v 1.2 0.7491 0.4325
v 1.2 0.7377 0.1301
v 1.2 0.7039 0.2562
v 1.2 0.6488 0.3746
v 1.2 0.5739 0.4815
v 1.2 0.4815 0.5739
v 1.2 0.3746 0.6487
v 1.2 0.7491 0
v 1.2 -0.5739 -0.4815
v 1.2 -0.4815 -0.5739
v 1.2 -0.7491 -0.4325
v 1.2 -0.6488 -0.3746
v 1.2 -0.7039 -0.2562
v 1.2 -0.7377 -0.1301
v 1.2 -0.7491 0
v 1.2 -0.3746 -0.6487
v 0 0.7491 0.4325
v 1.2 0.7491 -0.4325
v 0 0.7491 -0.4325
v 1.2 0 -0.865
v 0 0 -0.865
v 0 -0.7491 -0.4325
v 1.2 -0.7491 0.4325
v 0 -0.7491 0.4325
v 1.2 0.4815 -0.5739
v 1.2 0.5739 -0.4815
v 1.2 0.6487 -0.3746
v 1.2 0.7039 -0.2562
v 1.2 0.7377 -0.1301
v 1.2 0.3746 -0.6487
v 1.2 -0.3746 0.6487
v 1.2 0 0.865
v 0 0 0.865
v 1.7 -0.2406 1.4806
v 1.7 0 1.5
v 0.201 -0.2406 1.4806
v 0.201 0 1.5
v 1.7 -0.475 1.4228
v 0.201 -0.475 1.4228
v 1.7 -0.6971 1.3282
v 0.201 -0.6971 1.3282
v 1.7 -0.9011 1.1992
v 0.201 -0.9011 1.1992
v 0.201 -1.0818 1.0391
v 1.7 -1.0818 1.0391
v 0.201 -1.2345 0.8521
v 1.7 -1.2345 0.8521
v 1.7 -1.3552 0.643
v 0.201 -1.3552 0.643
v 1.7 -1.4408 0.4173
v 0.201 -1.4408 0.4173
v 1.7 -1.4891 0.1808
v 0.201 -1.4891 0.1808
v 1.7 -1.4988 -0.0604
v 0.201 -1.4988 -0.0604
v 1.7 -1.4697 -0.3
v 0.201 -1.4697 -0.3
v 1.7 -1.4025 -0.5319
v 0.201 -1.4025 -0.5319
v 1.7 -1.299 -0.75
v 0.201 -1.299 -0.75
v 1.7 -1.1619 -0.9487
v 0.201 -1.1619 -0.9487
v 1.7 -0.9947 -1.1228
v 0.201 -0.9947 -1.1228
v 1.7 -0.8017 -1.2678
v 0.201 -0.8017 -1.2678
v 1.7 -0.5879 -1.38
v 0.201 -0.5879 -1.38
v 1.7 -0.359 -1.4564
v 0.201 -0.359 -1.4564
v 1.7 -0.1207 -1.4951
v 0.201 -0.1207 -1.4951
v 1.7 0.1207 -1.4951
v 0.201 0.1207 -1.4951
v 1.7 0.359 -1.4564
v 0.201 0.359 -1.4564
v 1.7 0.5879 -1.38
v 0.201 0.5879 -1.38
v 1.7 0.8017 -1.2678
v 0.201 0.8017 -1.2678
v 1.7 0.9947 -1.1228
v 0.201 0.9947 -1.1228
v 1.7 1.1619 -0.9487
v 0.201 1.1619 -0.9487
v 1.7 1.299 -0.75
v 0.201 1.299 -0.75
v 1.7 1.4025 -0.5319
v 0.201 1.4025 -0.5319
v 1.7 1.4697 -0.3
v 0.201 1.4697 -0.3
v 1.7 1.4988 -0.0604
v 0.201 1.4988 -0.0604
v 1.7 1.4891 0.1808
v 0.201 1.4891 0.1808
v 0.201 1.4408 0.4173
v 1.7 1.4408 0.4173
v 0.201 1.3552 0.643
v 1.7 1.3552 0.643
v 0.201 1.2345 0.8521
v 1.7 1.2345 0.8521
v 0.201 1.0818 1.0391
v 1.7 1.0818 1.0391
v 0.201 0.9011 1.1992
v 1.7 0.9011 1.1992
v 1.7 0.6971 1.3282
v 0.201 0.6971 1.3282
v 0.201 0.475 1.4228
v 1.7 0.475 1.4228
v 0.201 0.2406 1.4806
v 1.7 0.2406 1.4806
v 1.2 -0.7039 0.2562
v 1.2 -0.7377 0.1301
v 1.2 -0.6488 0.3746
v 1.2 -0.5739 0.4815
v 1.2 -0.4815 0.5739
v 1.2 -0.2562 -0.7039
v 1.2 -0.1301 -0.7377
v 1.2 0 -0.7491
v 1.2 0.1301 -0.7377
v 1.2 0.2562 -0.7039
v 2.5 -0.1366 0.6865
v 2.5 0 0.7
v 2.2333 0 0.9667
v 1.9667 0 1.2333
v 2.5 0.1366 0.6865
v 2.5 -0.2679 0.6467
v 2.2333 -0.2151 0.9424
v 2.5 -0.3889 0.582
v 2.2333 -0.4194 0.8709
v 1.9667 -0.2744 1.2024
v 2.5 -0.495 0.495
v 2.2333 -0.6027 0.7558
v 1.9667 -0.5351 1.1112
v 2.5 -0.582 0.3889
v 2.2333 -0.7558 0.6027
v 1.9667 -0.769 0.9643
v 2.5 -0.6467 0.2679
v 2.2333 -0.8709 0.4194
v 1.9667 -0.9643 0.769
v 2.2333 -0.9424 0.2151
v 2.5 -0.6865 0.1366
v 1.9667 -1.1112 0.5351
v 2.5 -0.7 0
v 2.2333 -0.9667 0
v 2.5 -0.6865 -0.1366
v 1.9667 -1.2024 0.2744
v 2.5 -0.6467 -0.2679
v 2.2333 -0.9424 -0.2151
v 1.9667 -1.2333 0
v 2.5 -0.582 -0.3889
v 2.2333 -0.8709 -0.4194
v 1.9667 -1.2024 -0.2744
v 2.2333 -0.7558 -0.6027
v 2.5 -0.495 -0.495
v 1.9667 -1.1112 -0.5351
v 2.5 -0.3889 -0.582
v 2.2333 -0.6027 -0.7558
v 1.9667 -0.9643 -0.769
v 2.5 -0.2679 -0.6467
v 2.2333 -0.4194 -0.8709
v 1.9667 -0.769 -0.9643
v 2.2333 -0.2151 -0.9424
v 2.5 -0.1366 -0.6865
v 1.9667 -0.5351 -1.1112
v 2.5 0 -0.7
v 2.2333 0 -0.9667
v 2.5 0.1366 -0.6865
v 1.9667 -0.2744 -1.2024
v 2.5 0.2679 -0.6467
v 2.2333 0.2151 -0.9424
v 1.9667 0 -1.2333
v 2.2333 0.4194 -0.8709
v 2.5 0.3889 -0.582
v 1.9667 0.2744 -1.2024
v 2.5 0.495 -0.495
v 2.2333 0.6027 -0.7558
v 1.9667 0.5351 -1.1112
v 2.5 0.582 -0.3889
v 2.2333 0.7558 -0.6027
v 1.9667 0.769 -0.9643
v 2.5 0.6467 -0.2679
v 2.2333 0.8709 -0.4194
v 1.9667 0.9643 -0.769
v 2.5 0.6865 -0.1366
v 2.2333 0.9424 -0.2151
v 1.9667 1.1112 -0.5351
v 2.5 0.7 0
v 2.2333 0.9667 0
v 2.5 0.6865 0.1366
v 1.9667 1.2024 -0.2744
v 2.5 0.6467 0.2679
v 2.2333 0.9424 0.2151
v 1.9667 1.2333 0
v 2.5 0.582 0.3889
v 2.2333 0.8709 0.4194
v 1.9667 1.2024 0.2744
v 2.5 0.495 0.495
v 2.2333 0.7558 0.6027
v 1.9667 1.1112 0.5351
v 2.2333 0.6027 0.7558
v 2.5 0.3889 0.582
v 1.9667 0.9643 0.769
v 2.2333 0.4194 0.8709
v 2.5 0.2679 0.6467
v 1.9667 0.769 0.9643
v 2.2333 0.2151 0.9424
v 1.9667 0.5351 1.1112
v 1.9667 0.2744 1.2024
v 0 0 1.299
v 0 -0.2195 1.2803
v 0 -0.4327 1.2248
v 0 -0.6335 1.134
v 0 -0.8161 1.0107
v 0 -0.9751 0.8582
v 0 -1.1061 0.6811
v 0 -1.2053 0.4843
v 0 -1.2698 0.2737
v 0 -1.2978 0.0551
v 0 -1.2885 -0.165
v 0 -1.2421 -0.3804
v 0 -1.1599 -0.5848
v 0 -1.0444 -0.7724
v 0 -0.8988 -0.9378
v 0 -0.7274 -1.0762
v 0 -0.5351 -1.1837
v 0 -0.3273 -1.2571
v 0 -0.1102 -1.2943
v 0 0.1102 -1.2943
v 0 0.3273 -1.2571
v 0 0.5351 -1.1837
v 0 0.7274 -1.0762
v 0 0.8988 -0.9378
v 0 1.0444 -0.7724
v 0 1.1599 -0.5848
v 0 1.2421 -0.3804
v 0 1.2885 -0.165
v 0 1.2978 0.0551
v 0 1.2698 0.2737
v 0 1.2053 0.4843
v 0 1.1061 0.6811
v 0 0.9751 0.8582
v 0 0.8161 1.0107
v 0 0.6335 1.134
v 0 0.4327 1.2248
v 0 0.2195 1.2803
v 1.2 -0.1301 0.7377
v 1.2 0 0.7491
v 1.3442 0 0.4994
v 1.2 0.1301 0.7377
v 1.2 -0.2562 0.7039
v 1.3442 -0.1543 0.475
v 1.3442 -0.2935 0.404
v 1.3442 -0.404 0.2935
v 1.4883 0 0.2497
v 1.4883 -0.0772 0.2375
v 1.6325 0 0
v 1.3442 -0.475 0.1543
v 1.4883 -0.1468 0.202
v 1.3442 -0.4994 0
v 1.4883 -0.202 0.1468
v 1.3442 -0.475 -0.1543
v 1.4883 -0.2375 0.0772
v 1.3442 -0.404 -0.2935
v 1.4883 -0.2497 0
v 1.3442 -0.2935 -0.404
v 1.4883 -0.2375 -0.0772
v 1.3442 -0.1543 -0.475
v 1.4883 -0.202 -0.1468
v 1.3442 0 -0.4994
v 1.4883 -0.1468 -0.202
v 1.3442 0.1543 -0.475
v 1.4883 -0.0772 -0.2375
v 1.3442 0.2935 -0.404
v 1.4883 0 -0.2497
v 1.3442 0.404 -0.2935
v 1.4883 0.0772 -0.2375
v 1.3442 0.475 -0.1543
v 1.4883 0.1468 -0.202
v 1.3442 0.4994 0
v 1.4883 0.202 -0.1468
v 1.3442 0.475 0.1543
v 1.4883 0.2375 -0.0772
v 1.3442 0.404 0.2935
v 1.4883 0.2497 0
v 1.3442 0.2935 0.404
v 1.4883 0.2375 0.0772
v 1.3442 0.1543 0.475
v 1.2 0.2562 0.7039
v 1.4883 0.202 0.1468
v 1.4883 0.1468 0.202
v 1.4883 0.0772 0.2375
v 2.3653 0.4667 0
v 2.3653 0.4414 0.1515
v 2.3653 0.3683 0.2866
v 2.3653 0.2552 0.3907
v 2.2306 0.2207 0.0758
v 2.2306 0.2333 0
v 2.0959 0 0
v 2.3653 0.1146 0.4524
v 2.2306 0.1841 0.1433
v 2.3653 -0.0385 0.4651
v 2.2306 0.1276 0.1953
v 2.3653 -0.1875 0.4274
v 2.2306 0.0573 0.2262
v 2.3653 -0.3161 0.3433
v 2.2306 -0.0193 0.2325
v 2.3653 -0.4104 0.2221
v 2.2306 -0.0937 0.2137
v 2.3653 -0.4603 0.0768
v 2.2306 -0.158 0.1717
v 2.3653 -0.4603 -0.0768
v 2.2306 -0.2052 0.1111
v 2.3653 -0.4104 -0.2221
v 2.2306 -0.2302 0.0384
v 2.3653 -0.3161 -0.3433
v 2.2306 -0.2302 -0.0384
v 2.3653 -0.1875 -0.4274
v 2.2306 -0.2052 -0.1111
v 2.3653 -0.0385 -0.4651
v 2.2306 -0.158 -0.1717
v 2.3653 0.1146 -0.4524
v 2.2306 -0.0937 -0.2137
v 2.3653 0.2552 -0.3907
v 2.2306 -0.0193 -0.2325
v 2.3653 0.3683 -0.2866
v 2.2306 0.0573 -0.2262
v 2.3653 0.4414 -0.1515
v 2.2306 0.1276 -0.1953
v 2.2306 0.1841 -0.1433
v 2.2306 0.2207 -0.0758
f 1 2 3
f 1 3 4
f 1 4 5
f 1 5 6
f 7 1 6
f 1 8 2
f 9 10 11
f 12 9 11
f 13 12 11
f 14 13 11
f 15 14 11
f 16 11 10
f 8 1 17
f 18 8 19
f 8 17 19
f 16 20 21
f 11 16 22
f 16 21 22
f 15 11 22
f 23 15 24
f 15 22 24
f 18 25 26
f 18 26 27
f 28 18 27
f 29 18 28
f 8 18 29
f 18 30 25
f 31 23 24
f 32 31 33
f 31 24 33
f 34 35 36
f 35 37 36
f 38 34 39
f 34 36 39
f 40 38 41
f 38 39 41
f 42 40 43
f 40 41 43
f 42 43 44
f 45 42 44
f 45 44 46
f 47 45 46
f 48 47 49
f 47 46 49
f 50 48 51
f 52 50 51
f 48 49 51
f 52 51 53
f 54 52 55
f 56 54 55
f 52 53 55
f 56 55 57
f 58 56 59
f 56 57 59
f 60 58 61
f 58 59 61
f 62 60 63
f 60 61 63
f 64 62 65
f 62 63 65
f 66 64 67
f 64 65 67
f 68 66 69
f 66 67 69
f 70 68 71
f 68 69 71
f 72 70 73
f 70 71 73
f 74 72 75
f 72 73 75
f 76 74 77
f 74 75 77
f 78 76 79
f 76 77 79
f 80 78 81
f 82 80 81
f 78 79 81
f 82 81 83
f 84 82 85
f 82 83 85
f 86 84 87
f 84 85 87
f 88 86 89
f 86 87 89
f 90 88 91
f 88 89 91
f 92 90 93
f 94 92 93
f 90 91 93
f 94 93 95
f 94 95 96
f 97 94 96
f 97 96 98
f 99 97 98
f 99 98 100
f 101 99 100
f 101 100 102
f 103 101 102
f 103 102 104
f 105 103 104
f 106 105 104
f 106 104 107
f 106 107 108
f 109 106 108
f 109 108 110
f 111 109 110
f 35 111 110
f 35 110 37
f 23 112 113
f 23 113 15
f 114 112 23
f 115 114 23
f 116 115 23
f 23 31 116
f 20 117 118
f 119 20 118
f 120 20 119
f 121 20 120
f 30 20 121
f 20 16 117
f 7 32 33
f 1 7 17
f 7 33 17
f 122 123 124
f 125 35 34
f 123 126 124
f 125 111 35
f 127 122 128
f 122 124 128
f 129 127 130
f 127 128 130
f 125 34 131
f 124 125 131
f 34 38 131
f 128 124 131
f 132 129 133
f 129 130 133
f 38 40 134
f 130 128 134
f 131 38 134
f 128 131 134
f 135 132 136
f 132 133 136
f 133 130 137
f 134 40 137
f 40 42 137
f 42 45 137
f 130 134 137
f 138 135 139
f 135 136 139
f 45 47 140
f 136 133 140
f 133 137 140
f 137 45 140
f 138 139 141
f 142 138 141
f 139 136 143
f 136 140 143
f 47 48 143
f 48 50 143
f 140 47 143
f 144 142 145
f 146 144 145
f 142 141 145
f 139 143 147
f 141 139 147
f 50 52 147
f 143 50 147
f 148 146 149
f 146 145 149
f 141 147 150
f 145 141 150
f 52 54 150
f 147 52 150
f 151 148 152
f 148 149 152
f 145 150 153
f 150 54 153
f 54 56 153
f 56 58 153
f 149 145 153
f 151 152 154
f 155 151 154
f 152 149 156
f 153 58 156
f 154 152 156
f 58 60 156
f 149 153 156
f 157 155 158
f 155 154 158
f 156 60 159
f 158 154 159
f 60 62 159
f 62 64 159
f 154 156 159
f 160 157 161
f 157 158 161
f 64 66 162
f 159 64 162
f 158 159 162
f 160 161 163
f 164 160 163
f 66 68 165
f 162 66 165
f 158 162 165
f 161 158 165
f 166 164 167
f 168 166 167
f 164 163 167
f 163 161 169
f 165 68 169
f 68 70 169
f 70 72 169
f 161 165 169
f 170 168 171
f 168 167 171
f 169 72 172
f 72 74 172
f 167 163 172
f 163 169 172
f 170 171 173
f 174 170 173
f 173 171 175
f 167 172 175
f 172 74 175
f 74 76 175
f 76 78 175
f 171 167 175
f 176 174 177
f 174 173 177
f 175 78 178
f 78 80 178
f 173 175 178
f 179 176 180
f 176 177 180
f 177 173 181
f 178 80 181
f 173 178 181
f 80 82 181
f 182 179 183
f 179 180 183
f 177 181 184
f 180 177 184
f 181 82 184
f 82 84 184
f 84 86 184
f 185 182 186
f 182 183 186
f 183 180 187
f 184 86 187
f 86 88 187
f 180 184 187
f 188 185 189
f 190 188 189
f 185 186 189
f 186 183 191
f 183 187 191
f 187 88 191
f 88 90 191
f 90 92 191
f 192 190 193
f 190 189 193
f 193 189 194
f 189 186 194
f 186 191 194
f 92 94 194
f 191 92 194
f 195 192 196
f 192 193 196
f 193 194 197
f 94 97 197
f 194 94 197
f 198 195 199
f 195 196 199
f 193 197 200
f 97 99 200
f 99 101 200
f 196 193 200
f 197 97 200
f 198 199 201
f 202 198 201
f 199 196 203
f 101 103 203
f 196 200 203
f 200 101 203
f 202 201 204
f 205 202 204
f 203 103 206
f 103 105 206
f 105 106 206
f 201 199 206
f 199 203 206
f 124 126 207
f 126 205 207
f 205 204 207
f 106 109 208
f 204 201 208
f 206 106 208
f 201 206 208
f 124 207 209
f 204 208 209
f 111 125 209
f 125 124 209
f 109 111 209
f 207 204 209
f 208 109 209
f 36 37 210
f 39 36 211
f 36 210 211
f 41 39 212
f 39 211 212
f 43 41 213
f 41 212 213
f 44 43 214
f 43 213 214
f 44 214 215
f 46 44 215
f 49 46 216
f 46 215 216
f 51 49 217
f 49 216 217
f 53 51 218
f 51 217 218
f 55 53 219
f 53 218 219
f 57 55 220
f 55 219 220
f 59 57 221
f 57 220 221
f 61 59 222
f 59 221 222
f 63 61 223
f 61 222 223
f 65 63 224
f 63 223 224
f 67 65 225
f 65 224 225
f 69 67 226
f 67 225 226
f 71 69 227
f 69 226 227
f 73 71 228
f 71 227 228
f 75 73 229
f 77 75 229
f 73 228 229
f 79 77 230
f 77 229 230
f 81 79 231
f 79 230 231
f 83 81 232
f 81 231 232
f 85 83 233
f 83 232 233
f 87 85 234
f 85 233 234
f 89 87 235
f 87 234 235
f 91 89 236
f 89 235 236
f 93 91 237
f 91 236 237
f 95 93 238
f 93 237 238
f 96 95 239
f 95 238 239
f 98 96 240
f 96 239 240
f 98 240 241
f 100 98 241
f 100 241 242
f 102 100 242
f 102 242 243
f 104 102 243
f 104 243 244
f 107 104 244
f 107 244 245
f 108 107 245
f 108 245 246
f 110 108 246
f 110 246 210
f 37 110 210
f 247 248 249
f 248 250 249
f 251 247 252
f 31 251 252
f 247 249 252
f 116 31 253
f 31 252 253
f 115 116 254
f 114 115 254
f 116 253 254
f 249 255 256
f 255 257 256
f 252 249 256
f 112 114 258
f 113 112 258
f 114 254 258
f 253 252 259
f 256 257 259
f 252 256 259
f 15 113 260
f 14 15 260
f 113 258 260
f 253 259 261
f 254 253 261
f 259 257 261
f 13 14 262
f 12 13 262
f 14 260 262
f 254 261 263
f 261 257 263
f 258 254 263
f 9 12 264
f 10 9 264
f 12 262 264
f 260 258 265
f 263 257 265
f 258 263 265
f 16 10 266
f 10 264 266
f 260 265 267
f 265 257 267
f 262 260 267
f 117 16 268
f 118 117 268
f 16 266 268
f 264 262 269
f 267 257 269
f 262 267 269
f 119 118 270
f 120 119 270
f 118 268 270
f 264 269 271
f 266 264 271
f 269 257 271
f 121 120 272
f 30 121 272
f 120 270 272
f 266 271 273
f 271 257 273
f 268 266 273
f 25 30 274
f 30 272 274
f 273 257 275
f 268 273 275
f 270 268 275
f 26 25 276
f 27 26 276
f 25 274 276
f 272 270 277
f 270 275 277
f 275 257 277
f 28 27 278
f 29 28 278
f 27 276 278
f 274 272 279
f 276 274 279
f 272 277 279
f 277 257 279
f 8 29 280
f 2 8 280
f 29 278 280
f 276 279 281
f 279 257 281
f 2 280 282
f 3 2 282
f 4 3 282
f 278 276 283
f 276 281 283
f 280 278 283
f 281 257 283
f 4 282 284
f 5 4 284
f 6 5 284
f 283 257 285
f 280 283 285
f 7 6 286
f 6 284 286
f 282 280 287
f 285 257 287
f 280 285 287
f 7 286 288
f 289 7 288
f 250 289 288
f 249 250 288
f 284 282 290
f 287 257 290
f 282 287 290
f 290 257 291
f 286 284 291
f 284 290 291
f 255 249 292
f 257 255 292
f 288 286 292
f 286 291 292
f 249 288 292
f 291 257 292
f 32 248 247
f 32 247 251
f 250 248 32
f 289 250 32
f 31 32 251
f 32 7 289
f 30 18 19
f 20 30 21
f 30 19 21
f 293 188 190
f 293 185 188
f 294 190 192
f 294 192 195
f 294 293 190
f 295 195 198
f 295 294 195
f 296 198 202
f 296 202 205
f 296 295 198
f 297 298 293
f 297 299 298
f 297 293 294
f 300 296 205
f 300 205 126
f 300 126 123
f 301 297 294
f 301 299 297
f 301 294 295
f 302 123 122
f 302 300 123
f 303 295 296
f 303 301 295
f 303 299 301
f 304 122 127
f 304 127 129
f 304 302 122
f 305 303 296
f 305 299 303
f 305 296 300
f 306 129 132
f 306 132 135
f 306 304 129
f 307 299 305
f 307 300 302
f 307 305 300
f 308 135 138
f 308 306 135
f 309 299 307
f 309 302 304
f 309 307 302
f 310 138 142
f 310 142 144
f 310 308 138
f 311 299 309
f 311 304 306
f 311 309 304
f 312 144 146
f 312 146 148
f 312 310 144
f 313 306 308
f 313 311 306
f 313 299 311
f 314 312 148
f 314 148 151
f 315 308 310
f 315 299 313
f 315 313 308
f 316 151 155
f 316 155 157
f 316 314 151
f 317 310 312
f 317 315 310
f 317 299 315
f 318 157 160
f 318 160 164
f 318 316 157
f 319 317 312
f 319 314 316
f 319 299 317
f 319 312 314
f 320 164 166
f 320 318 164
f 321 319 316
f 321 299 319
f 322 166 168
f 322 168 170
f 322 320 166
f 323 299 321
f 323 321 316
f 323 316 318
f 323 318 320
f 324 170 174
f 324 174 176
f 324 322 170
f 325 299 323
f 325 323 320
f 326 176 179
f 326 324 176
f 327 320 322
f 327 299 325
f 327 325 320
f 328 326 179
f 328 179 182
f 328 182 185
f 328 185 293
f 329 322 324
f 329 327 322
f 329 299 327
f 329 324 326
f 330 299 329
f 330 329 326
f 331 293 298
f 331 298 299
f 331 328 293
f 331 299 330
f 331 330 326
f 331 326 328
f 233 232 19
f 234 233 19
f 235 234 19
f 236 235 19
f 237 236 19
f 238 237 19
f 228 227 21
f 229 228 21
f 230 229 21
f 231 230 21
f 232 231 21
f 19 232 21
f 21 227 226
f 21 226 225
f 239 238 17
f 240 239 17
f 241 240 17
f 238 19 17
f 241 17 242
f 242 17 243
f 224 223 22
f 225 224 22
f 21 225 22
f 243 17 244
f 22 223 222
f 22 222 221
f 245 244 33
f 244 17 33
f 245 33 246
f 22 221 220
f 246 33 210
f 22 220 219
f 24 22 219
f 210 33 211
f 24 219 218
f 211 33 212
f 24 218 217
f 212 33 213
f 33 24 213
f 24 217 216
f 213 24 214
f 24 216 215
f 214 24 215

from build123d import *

# Parameters (mm, degrees)
CUT_EXTRUDE_1_DEPTH = 1.2


with BuildPart() as part:
    # 草图2 → Revolve 588 (revolve)
    with BuildSketch(Plane.XY, mode=Mode.PRIVATE) as revolve_588_sk:
        Polygon((0, 0), (2.5, 0), (2.5, 0.7), (1.7, 1.5), (0.201, 1.5), (0, 1.299), align=None)
    revolve(revolve_588_sk.sketch.rotate(Axis((-0.262128326, 0, 0), (1, 0, 0)), 90), axis=Axis((-0.262128326, 0, 0), (1, 0, 0)))

    # 草图3 → 切除-拉伸1 (cut)
    with BuildSketch(Plane.ZY):
        Polygon((0.865, 0), (0.4325, 0.749111974), (-0.4325, 0.749111974), (-0.865, 0), (-0.4325, -0.749111974), (0.4325, -0.749111974), align=None)
    extrude(amount=-CUT_EXTRUDE_1_DEPTH, mode=Mode.SUBTRACT)

    # 草图4 → 切除-旋转1 (revolve, cut)
    with BuildSketch(Plane.XY, mode=Mode.PRIVATE) as cut_revolve_1_sk:
        Polygon((1.2, 0.749111974), (1.6325, 0), (1.2, 0), align=None)
    revolve(cut_revolve_1_sk.sketch.rotate(Axis((-0.121283255, 0, 0), (1, 0, 0)), 90), axis=Axis((-0.121283255, 0, 0), (1, 0, 0)), mode=Mode.SUBTRACT)

    # 草图6 → 切除-旋转2 (revolve, cut)
    with BuildSketch(Plane.XY):
        Polygon((2.5, 0), (2.5, 0.7), (2.095854812, 0), align=None)
    revolve(axis=Axis((-1.727695698, 0, 0), (1, 0, 0)), mode=Mode.SUBTRACT)


solid = part.part
